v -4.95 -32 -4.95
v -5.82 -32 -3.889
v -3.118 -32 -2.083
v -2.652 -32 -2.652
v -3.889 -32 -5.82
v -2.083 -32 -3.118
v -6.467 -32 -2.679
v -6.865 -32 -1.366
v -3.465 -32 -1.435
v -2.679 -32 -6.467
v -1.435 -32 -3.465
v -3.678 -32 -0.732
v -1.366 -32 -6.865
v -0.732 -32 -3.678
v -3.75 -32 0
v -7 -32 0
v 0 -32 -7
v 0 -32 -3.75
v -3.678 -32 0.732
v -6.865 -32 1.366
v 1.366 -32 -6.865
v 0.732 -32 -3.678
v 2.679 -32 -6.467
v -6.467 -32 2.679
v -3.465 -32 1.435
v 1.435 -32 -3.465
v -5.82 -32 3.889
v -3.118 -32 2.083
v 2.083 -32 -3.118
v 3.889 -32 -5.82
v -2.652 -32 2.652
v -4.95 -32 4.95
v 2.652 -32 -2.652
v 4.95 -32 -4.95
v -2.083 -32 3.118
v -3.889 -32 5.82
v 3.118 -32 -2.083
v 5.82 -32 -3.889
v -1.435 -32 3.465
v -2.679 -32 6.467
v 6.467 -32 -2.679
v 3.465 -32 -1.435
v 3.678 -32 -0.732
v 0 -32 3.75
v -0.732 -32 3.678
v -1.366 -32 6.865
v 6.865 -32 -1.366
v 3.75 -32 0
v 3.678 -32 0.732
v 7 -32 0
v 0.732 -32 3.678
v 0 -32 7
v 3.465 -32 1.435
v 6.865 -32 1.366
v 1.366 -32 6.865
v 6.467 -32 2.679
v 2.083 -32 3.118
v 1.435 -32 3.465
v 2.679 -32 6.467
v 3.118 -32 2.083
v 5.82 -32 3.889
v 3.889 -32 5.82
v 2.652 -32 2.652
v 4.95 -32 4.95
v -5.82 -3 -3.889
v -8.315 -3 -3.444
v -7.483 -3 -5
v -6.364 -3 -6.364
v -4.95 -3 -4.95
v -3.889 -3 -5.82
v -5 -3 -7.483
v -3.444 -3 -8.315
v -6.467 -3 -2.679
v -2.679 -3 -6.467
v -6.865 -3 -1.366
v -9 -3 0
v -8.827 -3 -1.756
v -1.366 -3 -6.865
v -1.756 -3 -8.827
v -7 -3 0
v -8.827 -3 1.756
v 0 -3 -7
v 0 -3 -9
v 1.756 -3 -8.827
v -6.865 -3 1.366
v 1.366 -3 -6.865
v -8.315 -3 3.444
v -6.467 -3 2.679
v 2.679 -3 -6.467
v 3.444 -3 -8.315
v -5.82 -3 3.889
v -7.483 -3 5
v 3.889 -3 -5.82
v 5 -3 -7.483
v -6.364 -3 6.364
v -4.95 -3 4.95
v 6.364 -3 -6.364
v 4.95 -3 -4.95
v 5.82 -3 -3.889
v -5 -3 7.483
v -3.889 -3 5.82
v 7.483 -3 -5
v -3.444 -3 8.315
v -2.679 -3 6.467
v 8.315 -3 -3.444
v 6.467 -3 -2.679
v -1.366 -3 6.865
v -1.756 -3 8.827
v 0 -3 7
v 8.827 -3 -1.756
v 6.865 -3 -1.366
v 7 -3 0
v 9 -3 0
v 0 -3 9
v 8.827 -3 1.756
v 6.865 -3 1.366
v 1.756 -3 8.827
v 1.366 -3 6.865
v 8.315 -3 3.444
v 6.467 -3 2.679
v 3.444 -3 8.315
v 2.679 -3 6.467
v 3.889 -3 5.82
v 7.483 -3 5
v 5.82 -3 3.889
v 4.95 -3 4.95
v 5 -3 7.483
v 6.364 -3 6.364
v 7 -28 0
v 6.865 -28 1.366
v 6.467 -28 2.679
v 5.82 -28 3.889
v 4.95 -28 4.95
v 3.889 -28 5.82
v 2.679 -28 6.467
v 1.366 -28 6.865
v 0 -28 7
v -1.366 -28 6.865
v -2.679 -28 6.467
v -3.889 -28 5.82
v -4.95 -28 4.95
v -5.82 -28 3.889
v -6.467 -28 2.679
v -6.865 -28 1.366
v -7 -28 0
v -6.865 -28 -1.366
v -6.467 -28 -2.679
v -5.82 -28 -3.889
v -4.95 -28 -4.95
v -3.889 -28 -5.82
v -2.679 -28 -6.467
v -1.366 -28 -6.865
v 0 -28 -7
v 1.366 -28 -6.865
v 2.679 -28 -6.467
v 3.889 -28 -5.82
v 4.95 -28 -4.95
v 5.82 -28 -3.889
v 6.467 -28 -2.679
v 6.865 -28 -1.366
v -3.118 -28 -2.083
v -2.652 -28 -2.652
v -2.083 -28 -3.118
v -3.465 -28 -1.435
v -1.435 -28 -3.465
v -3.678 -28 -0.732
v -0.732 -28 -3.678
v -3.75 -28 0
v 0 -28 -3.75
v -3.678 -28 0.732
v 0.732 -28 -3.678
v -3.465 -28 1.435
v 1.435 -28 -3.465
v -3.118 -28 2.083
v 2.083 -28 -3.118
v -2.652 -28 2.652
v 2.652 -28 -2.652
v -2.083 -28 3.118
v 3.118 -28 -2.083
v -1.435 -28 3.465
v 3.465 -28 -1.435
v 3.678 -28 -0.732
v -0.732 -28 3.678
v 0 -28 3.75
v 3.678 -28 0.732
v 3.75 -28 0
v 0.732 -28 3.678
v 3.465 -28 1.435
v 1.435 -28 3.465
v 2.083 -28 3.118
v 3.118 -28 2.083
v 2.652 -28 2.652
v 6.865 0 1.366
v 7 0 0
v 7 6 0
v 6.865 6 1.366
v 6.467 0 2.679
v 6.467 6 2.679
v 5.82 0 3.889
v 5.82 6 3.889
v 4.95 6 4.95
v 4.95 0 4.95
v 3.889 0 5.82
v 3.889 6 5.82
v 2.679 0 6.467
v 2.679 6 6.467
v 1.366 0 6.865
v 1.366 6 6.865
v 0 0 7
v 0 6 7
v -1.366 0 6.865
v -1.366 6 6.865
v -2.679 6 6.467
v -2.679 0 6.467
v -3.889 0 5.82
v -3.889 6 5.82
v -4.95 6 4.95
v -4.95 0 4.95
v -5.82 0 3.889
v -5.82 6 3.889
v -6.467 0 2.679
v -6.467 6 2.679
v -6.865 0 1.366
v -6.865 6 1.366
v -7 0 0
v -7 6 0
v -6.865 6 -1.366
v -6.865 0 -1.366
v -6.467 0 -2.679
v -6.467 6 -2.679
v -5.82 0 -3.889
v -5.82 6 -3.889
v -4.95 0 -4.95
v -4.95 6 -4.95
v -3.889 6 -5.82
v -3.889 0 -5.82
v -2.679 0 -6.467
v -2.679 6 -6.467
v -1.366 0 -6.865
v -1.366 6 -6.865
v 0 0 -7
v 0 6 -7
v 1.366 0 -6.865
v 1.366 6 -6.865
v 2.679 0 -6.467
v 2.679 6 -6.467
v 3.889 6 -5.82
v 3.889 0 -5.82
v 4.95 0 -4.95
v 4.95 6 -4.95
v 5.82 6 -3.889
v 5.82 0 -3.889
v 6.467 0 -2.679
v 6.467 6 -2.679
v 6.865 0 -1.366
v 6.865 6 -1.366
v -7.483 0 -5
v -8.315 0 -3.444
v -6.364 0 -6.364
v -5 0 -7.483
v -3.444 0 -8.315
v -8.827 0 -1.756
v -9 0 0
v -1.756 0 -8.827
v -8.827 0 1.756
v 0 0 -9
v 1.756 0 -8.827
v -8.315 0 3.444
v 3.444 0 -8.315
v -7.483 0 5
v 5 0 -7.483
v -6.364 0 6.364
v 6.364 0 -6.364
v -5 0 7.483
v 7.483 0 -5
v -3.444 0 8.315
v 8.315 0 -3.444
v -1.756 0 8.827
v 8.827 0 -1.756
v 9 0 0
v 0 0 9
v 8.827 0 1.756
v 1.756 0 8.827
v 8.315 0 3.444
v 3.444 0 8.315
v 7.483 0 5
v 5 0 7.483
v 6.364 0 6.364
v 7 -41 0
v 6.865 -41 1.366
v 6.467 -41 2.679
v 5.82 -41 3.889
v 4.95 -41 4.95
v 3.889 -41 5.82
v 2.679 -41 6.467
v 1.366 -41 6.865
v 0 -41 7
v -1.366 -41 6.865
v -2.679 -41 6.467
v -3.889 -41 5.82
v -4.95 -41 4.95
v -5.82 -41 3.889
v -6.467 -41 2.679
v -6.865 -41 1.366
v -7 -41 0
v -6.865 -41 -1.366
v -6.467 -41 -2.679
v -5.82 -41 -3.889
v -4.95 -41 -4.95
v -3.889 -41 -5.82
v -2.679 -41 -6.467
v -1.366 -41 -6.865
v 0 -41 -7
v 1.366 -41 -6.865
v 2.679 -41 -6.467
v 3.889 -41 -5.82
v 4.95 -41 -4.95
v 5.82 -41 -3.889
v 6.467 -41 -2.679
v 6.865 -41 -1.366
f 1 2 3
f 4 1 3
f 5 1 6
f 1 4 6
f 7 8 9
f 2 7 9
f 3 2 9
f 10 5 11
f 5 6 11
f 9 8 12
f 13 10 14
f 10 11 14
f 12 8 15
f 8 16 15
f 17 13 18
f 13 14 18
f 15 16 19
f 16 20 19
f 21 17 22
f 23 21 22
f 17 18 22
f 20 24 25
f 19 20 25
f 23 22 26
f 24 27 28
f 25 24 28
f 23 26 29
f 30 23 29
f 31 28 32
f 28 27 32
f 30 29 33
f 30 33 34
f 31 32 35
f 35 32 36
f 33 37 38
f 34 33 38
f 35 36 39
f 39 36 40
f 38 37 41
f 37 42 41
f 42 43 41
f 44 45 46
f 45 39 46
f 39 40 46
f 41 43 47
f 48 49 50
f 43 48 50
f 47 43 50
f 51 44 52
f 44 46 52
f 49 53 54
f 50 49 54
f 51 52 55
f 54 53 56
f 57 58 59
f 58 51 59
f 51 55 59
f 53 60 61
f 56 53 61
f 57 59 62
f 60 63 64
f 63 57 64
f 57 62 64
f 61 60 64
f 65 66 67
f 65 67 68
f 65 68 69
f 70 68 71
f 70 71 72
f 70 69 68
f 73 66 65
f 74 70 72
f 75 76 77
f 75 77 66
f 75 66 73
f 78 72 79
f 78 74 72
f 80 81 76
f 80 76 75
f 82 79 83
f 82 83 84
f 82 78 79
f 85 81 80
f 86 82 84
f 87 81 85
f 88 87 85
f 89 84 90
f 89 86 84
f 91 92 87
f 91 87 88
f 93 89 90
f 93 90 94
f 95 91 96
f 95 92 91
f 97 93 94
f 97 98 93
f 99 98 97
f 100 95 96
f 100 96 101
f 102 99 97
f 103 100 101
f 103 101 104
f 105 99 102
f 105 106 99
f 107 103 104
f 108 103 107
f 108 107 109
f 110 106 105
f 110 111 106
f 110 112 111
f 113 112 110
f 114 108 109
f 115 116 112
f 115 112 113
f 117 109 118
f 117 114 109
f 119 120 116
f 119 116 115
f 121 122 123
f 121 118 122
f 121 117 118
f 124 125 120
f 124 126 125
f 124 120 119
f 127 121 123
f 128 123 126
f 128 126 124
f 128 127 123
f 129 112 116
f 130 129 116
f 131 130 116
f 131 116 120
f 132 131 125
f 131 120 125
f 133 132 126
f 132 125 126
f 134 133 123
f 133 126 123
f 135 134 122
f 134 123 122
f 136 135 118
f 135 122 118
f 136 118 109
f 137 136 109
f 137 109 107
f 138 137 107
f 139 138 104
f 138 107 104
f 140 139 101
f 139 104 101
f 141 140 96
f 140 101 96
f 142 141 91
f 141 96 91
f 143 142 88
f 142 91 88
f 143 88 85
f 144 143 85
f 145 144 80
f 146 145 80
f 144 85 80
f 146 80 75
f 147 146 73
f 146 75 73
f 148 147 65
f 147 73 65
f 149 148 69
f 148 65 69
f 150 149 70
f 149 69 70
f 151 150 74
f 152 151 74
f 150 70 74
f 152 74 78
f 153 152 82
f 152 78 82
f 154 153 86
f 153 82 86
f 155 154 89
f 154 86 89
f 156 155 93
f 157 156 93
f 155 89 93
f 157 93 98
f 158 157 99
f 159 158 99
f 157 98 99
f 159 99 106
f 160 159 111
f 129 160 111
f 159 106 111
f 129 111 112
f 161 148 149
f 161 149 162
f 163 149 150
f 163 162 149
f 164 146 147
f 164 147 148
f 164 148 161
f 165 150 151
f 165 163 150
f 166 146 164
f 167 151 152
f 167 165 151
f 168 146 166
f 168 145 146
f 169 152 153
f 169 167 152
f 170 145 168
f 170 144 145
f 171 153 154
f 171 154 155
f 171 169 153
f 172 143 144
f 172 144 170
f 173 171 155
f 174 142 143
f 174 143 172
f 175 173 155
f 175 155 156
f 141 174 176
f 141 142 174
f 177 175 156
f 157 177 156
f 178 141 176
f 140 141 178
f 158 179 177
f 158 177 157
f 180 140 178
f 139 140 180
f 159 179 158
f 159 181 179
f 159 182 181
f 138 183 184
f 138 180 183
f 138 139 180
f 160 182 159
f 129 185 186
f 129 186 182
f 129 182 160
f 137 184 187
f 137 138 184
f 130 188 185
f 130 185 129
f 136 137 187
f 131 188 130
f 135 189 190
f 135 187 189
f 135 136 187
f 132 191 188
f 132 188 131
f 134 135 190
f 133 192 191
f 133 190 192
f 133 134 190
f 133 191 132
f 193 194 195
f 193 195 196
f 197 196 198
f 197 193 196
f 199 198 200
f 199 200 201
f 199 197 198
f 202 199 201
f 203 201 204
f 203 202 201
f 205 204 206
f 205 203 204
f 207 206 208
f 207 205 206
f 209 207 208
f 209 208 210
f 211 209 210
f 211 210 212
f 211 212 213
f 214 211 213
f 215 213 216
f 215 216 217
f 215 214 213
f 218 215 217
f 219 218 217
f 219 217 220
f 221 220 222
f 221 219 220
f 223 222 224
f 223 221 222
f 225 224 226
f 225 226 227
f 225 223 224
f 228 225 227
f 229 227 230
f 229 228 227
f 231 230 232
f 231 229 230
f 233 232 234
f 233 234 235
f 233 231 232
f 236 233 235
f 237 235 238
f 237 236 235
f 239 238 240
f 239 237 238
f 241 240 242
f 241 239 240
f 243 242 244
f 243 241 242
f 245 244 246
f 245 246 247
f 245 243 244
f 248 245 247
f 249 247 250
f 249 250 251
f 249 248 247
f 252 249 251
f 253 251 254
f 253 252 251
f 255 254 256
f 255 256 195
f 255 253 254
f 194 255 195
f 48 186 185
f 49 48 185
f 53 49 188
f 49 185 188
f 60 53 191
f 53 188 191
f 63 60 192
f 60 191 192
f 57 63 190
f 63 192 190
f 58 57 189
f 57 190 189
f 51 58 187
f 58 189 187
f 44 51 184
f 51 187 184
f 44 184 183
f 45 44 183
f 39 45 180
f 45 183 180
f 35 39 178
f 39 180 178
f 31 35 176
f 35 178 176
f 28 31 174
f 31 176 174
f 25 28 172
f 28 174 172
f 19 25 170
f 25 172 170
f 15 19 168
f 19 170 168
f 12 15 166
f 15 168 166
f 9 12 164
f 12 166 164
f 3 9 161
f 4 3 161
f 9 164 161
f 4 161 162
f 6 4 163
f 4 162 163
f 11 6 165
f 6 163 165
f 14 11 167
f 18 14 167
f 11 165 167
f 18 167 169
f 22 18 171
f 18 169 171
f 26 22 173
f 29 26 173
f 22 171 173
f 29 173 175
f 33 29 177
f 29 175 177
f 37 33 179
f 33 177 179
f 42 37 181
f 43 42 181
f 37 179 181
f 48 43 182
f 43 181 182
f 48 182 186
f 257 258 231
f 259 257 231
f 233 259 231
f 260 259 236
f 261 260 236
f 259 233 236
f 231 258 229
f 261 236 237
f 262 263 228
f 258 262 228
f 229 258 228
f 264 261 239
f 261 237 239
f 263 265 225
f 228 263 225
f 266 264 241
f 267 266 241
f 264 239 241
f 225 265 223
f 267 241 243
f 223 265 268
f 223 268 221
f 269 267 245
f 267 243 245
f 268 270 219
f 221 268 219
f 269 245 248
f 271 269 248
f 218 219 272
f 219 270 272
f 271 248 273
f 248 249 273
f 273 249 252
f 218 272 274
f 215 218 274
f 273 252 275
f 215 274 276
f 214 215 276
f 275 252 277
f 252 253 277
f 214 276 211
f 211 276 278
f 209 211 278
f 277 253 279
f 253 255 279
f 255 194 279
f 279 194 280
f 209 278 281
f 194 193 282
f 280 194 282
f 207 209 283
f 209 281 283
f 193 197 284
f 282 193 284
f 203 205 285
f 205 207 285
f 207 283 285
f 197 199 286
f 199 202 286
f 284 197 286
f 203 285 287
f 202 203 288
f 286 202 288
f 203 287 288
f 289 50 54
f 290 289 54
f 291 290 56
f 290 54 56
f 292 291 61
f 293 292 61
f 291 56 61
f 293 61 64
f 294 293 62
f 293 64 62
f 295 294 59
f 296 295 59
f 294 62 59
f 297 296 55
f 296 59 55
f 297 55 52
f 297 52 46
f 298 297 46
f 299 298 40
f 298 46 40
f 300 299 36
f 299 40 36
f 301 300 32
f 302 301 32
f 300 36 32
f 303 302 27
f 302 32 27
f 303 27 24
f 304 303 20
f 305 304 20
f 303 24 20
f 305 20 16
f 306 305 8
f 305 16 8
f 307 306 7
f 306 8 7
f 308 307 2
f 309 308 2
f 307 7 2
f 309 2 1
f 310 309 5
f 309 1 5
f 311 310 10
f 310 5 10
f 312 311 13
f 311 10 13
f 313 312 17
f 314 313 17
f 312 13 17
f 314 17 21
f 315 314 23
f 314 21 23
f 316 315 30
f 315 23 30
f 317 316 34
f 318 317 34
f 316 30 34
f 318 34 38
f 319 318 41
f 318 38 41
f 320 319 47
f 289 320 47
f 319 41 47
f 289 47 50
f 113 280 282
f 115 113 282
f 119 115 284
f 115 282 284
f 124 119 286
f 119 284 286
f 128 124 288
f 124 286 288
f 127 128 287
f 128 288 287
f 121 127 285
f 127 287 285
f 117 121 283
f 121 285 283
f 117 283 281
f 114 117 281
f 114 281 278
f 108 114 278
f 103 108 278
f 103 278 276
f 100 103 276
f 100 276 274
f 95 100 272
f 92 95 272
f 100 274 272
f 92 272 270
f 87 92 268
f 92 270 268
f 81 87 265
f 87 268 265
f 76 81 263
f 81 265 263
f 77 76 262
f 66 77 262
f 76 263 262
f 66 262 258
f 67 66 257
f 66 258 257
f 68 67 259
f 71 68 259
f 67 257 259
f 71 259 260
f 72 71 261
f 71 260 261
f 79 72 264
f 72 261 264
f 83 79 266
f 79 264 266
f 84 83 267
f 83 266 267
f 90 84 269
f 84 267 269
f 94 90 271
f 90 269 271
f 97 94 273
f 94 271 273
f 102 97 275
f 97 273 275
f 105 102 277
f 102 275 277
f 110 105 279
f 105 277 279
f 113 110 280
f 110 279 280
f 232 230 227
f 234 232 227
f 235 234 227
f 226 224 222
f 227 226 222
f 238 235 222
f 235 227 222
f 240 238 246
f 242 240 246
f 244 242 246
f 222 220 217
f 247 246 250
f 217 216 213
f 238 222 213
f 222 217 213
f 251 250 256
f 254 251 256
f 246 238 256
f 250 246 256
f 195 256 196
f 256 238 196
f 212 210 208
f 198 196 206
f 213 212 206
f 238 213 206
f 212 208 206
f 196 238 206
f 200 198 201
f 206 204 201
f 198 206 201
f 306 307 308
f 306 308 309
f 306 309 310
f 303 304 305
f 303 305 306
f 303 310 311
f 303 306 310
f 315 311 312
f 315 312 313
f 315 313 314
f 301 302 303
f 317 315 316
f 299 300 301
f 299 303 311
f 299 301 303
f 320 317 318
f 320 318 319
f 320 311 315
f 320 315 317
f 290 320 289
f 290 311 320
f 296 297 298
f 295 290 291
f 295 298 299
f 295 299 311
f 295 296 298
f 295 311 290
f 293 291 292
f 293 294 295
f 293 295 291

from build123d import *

# Parameters (mm, degrees)
F0_R     = 9
F0_R_2   = 7
F1_DEPTH = 3
F2_DEPTH = 6
F3_R     = 7
F4_DEPTH = 25
F5_R     = 3.75
F6_DEPTH = 4
F7_R     = 7
F8_DEPTH = 9


with BuildPart() as f1:
    # F0 (on Front) → F1 (new body)
    with BuildSketch(Plane.XZ):
        Circle(F0_R)
        Circle(F0_R_2, mode=Mode.SUBTRACT)
        Circle(F0_R_2)
    extrude(amount=F1_DEPTH)

    # F0 (on Front) → F2 (join)
    with BuildSketch(Plane.XZ):
        Circle(F0_R_2)
    extrude(amount=-F2_DEPTH)

    # F3 (on face) → F4 (join)
    with BuildSketch(Plane.XZ.offset(3)):
        Circle(F3_R)
    extrude(amount=F4_DEPTH)

    # F5 (on face) → F6 (join)
    with BuildSketch(Plane.XZ.offset(28)):
        Circle(F5_R)
    extrude(amount=F6_DEPTH)

    # F7 (on face) → F8 (join)
    with BuildSketch(Plane.XZ.offset(32)):
        Circle(F7_R)
    extrude(amount=F8_DEPTH)


solid = f1.part
